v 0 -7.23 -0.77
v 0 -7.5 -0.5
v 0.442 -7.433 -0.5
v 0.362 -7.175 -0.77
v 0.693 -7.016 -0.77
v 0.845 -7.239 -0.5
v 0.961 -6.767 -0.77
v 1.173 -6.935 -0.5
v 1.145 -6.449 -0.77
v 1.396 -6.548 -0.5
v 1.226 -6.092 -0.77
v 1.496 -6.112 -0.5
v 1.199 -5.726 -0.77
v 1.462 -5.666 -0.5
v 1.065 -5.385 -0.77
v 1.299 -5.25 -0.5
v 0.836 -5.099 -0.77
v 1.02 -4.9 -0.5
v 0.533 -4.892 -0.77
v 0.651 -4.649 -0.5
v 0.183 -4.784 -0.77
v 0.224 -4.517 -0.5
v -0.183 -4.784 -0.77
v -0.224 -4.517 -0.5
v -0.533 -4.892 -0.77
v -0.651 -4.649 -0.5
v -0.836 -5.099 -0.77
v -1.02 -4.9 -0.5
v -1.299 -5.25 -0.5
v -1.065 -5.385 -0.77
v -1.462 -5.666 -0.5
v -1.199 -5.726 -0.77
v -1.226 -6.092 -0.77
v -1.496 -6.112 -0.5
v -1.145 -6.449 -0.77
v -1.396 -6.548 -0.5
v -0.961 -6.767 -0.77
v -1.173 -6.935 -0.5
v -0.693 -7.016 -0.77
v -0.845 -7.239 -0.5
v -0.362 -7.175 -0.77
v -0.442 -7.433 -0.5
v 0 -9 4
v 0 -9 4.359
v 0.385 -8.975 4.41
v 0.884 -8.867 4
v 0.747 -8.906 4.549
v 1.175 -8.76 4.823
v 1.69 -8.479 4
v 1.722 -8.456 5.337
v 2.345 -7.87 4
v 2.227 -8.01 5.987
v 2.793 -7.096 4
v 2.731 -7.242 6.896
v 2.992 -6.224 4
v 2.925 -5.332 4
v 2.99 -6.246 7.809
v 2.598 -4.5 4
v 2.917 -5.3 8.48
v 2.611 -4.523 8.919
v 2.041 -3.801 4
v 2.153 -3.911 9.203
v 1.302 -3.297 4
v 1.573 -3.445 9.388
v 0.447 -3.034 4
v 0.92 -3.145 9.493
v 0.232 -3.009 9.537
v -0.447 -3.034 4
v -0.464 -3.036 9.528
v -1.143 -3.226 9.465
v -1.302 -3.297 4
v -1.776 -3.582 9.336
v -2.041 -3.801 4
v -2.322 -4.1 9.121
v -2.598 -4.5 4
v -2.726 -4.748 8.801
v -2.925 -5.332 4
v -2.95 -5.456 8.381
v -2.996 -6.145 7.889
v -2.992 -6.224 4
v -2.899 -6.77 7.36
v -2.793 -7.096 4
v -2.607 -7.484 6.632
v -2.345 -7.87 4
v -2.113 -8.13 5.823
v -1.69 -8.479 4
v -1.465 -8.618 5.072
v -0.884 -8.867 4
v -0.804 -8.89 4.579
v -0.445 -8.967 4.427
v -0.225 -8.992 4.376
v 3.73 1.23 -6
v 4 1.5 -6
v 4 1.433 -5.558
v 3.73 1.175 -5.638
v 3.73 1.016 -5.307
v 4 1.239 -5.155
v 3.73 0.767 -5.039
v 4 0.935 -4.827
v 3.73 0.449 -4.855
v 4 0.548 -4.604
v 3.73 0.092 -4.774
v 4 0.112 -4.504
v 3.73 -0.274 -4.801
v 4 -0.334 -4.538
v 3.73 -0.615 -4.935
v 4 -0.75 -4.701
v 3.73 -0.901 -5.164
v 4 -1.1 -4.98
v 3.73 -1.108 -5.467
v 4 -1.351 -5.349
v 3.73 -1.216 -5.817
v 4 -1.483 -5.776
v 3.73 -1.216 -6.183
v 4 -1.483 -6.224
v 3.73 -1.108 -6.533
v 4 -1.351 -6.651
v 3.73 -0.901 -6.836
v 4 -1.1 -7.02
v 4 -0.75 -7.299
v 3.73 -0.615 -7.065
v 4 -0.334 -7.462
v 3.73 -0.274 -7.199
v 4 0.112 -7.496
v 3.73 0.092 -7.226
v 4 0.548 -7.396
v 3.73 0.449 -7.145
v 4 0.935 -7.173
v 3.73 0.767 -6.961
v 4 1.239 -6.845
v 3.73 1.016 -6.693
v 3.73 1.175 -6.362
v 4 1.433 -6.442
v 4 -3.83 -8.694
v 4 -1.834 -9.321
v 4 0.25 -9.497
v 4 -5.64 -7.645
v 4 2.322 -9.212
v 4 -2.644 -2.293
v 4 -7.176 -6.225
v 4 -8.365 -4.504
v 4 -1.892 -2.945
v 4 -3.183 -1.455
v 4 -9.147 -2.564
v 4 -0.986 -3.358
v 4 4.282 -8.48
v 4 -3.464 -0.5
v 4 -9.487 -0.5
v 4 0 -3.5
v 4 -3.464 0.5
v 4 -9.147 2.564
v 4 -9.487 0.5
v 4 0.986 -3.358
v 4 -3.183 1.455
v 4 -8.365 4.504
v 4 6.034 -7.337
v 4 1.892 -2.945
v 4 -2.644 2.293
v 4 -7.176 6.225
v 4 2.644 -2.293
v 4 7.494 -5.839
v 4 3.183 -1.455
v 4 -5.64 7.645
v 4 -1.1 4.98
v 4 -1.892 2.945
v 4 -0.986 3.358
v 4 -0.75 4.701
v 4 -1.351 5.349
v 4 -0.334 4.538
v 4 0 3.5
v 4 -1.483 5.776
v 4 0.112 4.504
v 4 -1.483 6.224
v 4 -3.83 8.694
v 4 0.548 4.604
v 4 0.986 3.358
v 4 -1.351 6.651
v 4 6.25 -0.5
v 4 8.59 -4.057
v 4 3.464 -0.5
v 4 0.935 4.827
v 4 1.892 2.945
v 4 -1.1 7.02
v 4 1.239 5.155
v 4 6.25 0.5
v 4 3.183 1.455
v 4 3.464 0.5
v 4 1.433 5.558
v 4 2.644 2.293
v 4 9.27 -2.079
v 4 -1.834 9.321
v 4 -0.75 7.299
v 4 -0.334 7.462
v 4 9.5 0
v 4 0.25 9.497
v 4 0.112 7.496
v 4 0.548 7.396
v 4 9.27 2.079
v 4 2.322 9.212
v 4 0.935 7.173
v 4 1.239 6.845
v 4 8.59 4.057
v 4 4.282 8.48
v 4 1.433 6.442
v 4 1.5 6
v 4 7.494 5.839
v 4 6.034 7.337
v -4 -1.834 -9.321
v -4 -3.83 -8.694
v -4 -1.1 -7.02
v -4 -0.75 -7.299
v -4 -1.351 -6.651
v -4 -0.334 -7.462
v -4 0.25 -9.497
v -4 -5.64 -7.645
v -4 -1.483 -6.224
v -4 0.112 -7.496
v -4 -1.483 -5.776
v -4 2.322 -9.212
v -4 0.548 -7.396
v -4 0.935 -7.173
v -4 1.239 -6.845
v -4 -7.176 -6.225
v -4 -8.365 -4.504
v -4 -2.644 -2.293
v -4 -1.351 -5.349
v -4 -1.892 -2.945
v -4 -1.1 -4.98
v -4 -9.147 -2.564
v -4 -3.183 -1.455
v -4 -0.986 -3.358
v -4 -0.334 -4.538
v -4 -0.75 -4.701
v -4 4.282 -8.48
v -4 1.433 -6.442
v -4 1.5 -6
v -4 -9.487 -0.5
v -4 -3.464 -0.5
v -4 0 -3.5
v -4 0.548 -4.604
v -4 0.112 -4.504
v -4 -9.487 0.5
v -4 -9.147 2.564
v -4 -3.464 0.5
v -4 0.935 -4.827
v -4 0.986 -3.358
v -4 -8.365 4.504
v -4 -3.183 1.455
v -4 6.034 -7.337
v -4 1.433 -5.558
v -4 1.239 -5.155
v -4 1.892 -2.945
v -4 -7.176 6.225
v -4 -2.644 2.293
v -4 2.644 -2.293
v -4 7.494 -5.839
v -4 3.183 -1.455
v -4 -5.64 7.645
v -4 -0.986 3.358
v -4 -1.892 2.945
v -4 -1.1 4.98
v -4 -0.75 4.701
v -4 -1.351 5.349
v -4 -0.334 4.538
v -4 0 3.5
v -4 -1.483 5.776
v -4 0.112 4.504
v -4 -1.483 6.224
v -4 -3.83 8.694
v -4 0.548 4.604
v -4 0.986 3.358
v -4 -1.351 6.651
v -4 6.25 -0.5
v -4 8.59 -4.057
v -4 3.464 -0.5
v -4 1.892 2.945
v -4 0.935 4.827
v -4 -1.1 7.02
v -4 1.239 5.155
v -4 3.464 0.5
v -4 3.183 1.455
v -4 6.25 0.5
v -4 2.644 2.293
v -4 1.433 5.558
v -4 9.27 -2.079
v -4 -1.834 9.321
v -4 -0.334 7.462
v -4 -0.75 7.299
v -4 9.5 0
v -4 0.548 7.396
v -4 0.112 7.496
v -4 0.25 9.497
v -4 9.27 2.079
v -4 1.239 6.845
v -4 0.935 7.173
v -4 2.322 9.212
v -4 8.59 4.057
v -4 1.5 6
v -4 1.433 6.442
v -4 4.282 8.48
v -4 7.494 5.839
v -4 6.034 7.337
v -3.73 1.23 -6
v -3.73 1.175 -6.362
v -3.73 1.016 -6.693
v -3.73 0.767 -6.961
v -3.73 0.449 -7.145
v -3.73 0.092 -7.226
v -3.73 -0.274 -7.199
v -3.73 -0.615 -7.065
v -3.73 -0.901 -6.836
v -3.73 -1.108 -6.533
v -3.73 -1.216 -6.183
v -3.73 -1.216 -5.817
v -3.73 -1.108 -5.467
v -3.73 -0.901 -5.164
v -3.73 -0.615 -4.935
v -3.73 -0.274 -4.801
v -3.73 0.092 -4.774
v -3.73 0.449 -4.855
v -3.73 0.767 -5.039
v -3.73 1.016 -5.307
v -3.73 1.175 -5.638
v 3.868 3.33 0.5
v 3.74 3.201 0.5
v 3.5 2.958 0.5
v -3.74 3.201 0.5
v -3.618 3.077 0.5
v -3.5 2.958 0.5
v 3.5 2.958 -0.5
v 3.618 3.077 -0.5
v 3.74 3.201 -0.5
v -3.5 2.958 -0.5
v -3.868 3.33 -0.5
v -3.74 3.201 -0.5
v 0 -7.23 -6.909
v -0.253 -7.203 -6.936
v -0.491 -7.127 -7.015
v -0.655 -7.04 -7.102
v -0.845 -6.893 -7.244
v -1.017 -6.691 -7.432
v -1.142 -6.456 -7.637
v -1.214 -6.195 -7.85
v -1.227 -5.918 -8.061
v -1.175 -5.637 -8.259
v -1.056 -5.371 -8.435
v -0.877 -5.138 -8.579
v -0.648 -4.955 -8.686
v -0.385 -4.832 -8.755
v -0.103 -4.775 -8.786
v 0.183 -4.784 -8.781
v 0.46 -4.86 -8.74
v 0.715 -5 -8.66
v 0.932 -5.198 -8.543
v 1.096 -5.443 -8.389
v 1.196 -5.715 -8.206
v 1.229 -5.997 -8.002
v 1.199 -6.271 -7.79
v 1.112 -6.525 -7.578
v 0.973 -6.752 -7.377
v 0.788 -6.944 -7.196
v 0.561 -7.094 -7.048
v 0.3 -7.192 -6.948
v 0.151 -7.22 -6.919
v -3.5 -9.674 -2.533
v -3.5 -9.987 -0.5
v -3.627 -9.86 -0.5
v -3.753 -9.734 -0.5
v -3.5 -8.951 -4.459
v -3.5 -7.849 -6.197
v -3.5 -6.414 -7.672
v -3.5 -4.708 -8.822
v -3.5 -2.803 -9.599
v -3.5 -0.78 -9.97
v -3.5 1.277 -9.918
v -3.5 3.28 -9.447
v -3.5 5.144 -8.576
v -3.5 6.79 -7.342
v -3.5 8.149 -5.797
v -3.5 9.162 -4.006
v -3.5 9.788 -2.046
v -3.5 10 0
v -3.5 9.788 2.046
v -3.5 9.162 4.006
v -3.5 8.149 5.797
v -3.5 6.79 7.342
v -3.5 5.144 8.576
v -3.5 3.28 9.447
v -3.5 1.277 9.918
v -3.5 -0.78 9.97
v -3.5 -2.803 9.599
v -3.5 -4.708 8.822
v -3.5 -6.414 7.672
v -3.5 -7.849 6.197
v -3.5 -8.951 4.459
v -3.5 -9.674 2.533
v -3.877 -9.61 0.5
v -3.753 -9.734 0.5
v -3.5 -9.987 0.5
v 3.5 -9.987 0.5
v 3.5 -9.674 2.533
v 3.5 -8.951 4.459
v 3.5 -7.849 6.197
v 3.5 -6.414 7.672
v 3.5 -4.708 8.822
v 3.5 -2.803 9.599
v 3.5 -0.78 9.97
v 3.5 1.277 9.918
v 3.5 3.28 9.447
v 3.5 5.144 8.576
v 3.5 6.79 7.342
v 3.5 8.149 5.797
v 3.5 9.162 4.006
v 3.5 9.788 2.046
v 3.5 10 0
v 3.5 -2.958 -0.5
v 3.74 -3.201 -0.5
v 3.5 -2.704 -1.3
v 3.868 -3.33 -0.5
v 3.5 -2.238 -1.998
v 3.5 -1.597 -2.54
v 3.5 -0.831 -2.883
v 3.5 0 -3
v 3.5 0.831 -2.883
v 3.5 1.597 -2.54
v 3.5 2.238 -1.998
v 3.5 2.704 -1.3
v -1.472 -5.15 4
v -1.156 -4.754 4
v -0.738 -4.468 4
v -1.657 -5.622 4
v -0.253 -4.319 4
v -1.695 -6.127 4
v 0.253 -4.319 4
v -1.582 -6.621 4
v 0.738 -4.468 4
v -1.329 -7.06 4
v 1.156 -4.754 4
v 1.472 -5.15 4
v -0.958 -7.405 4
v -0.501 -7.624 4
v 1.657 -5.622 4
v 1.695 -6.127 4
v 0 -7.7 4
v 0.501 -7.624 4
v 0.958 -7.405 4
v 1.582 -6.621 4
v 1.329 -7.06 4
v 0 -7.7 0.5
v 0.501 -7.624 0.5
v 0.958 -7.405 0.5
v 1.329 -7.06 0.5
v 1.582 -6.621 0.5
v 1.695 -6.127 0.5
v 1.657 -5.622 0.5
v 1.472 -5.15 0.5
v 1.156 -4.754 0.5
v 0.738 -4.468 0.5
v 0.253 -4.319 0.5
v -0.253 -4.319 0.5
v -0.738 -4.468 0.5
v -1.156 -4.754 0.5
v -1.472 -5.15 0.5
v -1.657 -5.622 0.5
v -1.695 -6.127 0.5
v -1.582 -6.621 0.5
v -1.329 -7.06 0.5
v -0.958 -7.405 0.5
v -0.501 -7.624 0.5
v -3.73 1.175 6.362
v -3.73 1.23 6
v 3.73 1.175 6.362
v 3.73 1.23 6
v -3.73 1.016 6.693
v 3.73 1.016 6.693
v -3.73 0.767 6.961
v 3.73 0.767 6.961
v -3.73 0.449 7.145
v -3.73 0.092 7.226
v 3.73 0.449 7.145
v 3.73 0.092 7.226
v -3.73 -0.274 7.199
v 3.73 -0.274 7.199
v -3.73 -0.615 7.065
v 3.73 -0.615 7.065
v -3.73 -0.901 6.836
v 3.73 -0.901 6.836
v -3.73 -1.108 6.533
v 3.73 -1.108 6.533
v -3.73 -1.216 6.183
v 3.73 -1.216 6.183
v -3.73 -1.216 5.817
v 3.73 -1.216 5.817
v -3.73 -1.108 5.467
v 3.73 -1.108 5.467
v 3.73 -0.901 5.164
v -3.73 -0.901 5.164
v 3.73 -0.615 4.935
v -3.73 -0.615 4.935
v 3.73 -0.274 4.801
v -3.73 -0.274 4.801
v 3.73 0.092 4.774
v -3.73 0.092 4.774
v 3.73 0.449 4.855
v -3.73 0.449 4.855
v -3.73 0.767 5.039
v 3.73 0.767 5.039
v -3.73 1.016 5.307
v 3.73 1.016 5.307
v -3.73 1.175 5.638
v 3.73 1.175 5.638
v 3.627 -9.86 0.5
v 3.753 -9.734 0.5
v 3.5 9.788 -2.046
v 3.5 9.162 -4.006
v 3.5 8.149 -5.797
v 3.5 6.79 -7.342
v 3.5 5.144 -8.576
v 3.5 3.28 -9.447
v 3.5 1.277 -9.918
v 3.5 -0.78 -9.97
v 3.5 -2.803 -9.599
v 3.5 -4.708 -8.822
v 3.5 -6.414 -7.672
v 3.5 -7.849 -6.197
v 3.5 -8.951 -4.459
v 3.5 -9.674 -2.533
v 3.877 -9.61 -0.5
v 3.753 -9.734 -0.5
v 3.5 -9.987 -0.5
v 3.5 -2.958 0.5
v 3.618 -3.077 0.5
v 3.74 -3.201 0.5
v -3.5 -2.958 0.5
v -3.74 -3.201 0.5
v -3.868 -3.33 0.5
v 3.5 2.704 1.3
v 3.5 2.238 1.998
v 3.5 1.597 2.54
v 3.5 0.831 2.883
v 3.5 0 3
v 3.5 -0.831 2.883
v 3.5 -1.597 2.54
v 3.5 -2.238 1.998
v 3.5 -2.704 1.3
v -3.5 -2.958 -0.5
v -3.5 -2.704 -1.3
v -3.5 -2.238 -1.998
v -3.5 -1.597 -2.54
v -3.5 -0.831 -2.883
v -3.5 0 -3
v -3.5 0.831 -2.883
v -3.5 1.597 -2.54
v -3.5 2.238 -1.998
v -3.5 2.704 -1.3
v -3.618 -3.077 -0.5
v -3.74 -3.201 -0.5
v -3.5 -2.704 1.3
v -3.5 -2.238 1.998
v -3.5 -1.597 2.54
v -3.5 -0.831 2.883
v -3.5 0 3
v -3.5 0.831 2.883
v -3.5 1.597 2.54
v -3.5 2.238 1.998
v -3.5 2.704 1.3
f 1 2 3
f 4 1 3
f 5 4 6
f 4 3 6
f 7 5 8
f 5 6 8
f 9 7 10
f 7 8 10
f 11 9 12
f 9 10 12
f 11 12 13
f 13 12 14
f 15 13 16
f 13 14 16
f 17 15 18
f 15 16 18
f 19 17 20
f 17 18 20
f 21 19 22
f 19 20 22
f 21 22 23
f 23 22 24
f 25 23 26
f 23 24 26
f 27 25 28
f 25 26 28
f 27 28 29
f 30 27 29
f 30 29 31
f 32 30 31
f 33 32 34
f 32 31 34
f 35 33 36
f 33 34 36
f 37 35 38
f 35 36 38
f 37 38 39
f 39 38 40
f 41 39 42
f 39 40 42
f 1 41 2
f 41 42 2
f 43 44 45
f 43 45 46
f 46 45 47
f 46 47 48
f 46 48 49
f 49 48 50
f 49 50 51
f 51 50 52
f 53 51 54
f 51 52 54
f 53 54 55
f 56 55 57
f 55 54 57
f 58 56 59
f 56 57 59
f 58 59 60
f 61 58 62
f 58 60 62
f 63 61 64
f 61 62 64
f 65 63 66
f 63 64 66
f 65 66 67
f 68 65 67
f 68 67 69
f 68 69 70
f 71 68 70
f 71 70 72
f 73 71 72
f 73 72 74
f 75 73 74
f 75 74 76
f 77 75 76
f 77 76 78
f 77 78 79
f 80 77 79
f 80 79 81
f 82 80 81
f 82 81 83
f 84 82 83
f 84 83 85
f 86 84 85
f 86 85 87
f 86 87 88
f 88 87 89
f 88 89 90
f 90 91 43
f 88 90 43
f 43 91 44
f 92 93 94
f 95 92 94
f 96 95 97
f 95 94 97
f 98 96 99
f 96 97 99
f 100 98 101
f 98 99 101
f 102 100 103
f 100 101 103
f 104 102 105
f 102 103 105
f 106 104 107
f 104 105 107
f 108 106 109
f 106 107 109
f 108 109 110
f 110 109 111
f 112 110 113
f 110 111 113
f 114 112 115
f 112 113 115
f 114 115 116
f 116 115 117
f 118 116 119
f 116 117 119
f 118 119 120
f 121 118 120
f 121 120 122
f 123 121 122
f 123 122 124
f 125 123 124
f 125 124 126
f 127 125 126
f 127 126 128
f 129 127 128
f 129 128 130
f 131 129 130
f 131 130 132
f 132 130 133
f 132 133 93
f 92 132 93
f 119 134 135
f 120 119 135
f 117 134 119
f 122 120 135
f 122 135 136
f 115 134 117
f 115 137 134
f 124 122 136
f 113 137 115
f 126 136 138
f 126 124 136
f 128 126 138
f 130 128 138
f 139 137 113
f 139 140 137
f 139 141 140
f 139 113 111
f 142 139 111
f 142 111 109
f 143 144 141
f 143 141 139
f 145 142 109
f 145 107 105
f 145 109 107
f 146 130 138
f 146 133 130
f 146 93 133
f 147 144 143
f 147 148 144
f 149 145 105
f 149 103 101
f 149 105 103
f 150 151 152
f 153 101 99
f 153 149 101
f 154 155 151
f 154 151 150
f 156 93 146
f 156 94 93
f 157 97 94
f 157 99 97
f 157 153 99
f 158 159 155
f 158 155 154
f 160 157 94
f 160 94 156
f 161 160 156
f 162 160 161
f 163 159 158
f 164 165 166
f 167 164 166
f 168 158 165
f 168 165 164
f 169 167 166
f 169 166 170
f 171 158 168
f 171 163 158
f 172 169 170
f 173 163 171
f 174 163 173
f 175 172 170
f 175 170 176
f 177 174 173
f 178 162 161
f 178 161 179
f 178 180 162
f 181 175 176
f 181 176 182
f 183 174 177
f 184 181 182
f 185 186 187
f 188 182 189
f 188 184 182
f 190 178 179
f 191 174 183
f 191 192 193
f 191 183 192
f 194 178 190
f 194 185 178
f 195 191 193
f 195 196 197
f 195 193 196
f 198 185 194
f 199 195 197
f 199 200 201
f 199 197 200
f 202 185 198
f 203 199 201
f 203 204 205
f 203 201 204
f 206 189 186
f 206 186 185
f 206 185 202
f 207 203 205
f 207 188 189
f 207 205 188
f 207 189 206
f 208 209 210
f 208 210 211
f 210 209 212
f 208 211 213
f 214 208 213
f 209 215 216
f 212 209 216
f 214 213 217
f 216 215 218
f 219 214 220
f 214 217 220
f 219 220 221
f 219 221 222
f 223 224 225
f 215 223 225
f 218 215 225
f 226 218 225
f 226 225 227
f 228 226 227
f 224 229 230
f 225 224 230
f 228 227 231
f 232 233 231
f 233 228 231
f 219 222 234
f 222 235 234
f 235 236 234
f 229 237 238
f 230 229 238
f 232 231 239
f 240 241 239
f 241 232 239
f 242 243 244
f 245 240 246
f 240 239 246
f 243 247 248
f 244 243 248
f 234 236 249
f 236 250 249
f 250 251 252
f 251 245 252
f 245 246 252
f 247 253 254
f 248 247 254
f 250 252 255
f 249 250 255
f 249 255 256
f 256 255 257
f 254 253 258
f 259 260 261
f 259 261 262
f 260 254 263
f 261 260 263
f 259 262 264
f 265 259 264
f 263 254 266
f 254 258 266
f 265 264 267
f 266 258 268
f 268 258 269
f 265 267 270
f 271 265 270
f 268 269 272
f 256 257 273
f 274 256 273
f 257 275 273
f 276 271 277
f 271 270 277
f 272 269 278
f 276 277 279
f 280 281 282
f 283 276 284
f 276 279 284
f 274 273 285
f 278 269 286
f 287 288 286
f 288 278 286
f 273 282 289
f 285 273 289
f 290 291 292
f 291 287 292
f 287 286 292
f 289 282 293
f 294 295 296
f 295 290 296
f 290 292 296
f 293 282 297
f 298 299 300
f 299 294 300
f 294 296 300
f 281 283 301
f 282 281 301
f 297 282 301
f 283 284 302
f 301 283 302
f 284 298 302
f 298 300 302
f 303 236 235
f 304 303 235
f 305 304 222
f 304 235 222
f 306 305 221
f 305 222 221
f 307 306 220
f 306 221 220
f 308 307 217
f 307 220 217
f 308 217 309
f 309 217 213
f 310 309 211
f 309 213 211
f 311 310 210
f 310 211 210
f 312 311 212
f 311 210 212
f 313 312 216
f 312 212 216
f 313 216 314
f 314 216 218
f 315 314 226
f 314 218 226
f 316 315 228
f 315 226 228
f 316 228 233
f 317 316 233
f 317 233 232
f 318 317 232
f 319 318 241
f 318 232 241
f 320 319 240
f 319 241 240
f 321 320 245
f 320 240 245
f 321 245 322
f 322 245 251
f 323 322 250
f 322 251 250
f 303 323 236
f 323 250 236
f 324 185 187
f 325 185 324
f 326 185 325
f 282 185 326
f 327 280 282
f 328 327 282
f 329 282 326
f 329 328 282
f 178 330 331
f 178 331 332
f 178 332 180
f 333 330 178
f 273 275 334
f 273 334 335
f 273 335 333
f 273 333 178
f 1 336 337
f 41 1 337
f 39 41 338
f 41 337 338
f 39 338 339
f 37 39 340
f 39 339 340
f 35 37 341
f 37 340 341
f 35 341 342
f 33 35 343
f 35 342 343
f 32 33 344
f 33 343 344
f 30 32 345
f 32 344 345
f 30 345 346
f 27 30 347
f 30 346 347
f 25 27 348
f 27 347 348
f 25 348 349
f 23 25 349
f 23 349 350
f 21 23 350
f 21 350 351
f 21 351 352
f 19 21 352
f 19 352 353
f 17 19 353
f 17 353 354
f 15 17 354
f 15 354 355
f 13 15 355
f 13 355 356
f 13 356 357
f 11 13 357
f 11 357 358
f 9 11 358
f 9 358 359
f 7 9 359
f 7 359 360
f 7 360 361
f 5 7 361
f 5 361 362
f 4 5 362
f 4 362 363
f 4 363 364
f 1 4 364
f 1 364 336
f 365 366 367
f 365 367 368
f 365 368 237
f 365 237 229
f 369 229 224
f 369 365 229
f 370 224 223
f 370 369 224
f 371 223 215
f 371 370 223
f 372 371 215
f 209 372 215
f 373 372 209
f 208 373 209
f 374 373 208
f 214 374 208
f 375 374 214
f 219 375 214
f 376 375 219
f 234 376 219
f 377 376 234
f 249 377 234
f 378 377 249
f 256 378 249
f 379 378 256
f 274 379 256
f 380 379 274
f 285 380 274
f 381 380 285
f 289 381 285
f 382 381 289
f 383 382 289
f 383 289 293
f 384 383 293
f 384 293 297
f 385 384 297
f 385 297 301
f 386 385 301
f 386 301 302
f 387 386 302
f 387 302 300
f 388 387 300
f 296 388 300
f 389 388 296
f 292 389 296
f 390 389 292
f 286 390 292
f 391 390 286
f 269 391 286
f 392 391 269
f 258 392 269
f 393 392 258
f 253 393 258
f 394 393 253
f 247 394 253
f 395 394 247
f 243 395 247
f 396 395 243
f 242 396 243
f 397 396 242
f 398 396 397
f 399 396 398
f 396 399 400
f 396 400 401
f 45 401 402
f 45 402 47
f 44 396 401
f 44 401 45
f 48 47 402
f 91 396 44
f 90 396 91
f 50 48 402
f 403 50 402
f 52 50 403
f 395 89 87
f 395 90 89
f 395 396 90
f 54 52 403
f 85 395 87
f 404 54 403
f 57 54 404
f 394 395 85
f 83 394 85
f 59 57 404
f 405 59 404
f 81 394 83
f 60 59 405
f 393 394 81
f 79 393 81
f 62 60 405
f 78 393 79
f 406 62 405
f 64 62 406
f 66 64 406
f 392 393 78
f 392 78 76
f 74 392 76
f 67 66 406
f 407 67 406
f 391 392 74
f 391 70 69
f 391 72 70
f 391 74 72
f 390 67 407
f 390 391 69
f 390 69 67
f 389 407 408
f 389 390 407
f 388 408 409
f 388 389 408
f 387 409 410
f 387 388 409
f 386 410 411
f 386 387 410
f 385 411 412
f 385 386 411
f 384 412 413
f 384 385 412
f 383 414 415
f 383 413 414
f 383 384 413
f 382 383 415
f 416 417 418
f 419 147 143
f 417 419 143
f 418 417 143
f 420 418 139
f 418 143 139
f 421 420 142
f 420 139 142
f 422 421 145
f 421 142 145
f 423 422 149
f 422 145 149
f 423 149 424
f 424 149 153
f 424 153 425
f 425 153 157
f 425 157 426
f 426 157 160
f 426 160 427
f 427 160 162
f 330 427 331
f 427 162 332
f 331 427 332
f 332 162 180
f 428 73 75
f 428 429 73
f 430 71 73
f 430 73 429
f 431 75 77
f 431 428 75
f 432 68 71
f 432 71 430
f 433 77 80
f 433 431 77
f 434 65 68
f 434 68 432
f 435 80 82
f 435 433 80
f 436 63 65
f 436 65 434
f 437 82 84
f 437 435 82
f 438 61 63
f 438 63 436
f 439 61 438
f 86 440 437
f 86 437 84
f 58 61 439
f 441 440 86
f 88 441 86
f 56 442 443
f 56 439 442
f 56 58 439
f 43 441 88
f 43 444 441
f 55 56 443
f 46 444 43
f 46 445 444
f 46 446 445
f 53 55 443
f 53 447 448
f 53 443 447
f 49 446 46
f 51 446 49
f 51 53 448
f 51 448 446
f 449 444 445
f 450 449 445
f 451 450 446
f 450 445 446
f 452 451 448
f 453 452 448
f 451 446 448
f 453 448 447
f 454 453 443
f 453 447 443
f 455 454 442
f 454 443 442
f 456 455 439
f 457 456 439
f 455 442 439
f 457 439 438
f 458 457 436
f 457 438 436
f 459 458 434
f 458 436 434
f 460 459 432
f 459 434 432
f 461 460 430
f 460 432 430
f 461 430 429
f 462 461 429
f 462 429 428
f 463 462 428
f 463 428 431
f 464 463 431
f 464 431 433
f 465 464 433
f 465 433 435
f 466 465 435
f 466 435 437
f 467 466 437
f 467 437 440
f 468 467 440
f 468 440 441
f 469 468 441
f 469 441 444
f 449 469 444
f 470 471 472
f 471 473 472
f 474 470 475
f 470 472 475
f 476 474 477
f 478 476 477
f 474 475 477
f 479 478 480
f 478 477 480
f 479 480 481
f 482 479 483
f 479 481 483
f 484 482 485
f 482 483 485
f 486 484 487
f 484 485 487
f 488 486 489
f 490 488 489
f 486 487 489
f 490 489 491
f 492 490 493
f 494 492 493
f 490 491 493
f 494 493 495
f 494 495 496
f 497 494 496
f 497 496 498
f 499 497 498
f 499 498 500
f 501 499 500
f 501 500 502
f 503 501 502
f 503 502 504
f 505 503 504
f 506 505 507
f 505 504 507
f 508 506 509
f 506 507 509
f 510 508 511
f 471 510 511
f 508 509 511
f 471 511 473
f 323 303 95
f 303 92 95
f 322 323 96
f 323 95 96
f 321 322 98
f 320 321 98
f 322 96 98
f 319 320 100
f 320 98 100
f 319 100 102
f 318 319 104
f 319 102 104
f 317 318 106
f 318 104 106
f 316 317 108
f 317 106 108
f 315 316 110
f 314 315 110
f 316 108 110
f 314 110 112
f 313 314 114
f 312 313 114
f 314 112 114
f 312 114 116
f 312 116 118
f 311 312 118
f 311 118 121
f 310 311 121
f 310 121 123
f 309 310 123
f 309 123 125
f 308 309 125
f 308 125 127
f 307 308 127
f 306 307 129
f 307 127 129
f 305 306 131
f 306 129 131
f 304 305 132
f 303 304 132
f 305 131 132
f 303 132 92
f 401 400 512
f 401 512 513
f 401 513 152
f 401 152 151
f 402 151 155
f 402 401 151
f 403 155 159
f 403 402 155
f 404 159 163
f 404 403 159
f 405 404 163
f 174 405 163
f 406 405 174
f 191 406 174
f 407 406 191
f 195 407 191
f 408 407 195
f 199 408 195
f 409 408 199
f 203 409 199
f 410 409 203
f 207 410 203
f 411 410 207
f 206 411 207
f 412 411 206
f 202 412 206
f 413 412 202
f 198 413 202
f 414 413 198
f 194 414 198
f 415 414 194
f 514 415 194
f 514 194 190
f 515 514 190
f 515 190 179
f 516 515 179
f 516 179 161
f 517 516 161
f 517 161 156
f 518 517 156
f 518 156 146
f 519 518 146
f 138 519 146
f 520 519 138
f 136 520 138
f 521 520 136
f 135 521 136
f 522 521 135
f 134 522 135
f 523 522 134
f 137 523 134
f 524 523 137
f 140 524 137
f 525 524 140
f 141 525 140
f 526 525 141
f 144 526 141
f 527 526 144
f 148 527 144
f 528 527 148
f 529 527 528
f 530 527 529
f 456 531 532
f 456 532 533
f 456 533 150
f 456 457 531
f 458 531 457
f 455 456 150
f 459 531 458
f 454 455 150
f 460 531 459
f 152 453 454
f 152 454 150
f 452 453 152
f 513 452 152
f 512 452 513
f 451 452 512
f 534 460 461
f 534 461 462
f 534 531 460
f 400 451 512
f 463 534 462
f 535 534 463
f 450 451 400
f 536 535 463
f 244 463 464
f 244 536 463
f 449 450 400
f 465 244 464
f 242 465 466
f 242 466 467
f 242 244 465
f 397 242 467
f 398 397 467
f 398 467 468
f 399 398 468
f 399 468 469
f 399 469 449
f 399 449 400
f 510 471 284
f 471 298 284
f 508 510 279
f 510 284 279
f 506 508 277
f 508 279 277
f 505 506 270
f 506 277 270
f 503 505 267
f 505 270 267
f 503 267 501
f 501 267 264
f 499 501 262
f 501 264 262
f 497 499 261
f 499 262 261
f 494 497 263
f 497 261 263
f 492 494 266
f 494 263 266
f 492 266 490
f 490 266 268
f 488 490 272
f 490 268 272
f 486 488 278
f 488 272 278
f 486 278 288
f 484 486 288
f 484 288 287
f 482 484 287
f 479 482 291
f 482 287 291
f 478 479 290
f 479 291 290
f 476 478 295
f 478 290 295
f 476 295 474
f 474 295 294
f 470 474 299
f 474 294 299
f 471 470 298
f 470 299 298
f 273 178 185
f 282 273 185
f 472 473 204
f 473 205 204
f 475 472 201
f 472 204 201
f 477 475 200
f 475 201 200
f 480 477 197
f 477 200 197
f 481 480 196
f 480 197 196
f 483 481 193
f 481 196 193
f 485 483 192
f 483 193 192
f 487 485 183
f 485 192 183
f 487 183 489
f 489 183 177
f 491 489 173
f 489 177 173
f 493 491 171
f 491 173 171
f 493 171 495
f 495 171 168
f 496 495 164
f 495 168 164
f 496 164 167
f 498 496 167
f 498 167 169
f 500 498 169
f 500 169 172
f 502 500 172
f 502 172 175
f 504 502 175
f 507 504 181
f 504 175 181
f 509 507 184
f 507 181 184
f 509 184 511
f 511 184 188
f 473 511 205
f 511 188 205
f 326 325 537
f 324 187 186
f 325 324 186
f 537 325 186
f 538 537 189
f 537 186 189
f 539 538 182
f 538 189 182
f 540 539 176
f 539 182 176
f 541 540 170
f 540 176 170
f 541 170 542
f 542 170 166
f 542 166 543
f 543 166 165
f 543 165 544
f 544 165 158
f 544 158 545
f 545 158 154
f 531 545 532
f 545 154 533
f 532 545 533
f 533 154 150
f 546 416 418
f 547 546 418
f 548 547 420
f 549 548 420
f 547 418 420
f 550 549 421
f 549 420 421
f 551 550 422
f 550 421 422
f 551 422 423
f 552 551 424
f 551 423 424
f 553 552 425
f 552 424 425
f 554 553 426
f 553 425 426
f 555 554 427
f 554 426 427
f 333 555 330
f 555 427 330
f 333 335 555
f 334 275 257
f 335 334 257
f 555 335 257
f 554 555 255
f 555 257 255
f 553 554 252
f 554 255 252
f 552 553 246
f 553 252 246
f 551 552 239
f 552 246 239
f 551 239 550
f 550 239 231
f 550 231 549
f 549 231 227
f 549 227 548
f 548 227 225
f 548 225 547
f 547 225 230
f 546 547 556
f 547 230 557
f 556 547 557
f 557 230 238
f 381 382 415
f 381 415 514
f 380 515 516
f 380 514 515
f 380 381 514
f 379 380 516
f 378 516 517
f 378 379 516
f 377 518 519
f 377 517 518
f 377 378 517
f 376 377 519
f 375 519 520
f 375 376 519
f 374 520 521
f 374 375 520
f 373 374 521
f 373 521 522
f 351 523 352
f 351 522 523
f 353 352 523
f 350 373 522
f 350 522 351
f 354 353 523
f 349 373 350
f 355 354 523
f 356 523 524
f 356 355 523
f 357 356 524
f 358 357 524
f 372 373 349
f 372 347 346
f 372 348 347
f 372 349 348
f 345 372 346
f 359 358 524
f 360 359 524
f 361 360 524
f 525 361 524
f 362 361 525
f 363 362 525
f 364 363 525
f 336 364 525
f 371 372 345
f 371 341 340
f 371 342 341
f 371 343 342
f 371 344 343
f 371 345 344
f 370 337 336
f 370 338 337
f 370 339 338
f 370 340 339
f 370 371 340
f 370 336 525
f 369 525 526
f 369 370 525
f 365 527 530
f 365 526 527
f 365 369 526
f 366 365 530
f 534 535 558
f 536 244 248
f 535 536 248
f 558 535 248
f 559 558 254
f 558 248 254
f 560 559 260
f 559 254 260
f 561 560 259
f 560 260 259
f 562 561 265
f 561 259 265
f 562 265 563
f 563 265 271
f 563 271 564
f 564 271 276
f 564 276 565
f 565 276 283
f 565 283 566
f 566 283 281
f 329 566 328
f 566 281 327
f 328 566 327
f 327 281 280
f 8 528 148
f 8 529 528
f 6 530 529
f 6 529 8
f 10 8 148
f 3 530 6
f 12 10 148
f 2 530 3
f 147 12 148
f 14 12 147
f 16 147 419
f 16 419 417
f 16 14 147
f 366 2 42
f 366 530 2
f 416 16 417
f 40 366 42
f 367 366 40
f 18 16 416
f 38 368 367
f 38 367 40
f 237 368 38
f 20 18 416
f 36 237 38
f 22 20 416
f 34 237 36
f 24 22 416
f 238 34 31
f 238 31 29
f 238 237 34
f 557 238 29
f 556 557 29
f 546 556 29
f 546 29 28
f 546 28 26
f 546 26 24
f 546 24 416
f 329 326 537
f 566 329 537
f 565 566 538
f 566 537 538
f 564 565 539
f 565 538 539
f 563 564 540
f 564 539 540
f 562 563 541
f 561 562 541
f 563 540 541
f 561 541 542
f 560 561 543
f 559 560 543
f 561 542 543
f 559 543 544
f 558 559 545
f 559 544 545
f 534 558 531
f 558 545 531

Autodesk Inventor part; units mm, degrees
sketch "Sketch_1" plane through (0, 0, 0) normal (0, 0, 1) x (1, 0, 0)
  line L0 (4, 0) -> (-4, 0)
  line L1 (-4, 9.5) -> (-4, 3.5)
  line L2 (-4, 3.5) -> (-3.5, 3)
  line L3 (-3.5, 3) -> (3.5, 3)
  line L4 (3.5, 3) -> (4, 3.5)
  line L5 (4, 3.5) -> (4, 9.5)
  line L6 (4, 9.5) -> (3.5, 10)
  line L7 (3.5, 10) -> (-3.5, 10)
  line L8 (-3.5, 10) -> (-4, 9.5)
revolve "Revolution1" add sketch "Sketch_1" angle 360 about axis through (4, 0, 0) along (1, 0, 0)
sketch "Sketch_2" plane through (0, 0, 0) normal (1, 0, 0) x (0, 1, 0)
  line L0 (-10, 0.5) -> (-10, -0.5)
  line L1 (-10, -0.5) -> (6.25, -0.5)
  line L2 (6.25, -0.5) -> (6.25, 0.5)
  line L3 (6.25, 0.5) -> (-10, 0.5)
extrude "Extrusion1" cut sketch "Sketch_2" along normal mid plane 8
sketch "Sketch_3" plane through (0, 0, 0) normal (1, 0, 0) x (0, 1, 0)
  line L0 (-6, 10) -> (-6, 0)
  line L1 (-6, 0) -> (-7.7, 0)
  line L2 (-7.7, 0) -> (-7.7, 4)
  line L3 (-7.7, 4) -> (-9, 4)
  line L4 (-9, 4) -> (-9, 10)
  line L5 (-9, 10) -> (-6, 10)
  line L6 (-6, 10) -> (-6, 0)
revolve "Revolution2" cut sketch "Sketch_3" angle 360 about axis through (0, -6, 10) along (0, 0, 1)
sketch "Sketch4" plane through (-3.5, -2.958, -0.5) normal (0, 0, 1) x (1, 0, 0)
  point P0 (3.5, -3.042)
hole "Hole1" at (0, -6, -0.5) direction (0, 0, -1) diameter 2.459 depth 9 countersink diameter 3 countersink angle 90 thread size "M3x0.5" class "6H" standard "ISO Metric profile"
sketch "Sketch_7" plane through (0, 0, -6) normal (0, 0, 1) x (1, 0, 0)
  line L0 (4, 0) -> (-4, 0)
  line L1 (-4, 0) -> (-4, 1.5)
  line L2 (-4, 1.5) -> (-3.7295, 1.2295)
  line L3 (-3.7295, 1.2295) -> (3.7295, 1.2295)
  line L4 (3.7295, 1.2295) -> (4, 1.5)
  line L5 (4, 1.5) -> (4, 0)
  line L6 (4, 0) -> (-4, 0)
revolve "Revolution3" cut sketch "Sketch_7" angle 360 about axis through (4, 0, -6) along (1, 0, 0)
thread "Thread1" size "M3x0.5" class "6H" standard "ISO Metric profile" full length
sketch "Sketch_8" plane through (0, 0, 6) normal (0, 0, 1) x (1, 0, 0)
  line L0 (4, 0) -> (-4, 0)
  line L1 (-4, 0) -> (-4, 1.5)
  line L2 (-4, 1.5) -> (-3.7295, 1.2295)
  line L3 (-3.7295, 1.2295) -> (3.7295, 1.2295)
  line L4 (3.7295, 1.2295) -> (4, 1.5)
  line L5 (4, 1.5) -> (4, 0)
  line L6 (4, 0) -> (-4, 0)
revolve "Revolution4" cut sketch "Sketch_8" angle 360 about axis through (4, 0, 6) along (1, 0, 0)
thread "Thread2" size "M3x0.5" class "6H" standard "ISO Metric profile" full length
ref_plane "body_screw_XY" through (0, -6, 4) normal (0, 0, 1) x (1, 0, 0)
ref_plane "body_screw_YZ" through (0, -6, 4) normal (1, 0, 0) x (0, 1, 0)
ref_plane "body_screw_ZX" through (0, -6, 4) normal (0, 1, 0) x (0, 0, 1)
properties part number "SCSW6-8b" material "鋼、炭素鋼"
